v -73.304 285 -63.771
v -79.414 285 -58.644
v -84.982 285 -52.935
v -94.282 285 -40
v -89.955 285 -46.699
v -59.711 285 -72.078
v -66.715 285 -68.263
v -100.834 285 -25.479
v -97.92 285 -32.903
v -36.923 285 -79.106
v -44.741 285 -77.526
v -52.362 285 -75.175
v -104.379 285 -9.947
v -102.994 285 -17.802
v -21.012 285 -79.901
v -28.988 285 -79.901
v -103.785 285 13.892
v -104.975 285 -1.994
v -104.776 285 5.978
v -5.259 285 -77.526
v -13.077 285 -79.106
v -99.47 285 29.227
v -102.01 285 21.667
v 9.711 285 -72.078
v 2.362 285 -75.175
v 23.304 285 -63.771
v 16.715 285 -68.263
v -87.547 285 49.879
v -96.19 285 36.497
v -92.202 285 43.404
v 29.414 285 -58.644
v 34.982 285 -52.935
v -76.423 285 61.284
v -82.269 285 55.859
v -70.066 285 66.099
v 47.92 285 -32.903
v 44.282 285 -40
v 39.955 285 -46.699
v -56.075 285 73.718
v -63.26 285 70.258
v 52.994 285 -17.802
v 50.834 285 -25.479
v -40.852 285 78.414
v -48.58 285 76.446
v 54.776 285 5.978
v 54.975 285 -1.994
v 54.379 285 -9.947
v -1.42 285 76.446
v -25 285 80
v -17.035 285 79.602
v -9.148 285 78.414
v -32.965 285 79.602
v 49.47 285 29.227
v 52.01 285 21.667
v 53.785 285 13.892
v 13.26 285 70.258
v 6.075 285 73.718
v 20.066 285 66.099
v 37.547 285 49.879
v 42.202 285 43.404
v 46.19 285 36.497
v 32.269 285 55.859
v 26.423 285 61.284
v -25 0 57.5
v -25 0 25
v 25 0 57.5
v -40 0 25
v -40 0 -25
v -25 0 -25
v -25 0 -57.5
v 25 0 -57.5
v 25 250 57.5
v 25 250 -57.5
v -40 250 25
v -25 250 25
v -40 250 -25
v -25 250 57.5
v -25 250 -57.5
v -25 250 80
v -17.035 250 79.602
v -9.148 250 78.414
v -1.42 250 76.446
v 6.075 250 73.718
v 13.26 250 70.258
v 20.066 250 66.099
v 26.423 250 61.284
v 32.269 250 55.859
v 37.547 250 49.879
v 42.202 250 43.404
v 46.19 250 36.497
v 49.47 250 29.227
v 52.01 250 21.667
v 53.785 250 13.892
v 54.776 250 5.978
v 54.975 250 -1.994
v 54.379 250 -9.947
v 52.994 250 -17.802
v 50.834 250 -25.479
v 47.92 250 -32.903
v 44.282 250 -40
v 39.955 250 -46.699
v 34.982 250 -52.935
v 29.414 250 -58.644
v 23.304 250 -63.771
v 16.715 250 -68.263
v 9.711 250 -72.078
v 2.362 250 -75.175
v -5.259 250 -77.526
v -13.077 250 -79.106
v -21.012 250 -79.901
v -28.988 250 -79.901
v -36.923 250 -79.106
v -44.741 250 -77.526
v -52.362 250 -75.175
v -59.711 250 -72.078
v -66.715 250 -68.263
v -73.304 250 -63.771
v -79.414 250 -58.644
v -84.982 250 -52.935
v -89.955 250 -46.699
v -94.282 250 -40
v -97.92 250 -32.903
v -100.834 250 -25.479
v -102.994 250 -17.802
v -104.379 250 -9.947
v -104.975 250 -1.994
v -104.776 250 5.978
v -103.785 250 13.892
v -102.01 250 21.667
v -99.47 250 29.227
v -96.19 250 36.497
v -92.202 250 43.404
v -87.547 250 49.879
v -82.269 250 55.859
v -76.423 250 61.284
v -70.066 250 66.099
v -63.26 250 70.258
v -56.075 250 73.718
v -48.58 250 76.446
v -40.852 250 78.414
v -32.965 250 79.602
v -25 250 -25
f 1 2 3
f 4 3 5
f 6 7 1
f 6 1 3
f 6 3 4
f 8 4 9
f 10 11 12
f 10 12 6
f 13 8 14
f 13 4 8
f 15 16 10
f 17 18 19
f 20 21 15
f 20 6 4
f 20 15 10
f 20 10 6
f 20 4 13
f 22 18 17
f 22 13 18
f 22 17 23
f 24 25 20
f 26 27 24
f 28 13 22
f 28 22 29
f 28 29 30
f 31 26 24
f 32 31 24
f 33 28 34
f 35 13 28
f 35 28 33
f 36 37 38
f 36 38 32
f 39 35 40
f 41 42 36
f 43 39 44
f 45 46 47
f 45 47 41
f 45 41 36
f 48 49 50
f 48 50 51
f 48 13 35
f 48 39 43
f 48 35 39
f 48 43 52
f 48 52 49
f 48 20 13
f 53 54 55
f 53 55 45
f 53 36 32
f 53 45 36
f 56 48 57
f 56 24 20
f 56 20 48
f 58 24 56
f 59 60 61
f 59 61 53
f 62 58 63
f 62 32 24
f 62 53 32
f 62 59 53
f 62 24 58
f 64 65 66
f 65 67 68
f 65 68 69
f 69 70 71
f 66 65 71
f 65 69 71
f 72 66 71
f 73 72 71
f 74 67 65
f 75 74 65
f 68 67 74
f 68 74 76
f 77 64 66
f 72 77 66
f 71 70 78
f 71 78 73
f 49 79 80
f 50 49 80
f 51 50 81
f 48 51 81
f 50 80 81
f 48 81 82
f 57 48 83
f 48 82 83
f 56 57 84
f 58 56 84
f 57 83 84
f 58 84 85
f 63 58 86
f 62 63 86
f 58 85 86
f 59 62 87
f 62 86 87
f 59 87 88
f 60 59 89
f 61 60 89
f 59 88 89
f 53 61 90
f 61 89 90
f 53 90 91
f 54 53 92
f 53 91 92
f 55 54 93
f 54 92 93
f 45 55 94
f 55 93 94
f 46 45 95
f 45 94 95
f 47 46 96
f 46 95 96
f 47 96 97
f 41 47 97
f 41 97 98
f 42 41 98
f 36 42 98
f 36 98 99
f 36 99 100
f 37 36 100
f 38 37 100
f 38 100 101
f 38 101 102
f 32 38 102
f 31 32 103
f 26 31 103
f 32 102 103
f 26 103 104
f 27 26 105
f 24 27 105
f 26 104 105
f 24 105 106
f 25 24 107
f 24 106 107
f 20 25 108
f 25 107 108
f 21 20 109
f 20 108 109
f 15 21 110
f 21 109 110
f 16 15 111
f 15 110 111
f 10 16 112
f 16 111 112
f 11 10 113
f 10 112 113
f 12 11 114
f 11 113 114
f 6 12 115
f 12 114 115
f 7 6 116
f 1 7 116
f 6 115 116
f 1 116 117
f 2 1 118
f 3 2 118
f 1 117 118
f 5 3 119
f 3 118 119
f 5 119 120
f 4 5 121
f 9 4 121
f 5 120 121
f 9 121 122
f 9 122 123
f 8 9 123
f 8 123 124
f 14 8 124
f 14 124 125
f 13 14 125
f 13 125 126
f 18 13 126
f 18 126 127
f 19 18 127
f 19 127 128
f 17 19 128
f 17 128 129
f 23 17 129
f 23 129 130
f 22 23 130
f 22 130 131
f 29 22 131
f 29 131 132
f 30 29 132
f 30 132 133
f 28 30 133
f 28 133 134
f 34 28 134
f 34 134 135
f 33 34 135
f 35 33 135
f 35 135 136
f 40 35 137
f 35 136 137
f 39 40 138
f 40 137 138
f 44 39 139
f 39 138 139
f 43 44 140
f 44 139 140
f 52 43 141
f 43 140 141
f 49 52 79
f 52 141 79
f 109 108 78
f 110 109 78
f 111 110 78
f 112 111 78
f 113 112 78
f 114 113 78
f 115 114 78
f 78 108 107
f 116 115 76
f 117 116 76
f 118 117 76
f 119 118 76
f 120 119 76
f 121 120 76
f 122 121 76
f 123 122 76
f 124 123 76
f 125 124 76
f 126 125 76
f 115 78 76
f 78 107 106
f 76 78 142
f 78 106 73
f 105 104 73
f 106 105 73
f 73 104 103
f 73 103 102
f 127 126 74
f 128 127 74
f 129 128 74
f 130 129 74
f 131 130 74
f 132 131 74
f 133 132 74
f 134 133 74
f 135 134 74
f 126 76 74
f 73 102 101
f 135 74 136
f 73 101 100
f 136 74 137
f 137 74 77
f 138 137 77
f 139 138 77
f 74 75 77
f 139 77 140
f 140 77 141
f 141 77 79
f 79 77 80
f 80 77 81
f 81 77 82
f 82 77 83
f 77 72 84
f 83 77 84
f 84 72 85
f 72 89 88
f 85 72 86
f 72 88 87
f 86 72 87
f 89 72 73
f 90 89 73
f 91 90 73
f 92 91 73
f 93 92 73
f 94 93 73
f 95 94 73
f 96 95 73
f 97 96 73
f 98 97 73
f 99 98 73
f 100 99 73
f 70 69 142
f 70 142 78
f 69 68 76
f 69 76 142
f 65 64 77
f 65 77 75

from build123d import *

# Parameters (mm, degrees)
CROQUIS1_W              = 15
CROQUIS1_H              = 50
CROQUIS1_W_2            = 50
CROQUIS1_H_2            = 115
SALIENTE_EXTRUIR1_DEPTH = 250
CROQUIS2_R              = 80
SALIENTE_EXTRUIR2_DEPTH = 35


with BuildPart() as part:
    # Croquis1 → Saliente-Extruir1 (new body)
    with BuildSketch(Plane(origin=(0, 0, 0), x_dir=(1, 0, 0), z_dir=(0, 1, 0))):
        with Locations((-32.5, 0)):
            Rectangle(CROQUIS1_W, CROQUIS1_H)
        Rectangle(CROQUIS1_W_2, CROQUIS1_H_2)
    extrude(amount=SALIENTE_EXTRUIR1_DEPTH)

    # Croquis2 → Saliente-Extruir2 (add)
    with BuildSketch(Plane(origin=(0, 250, 0), x_dir=(1, 0, 0), z_dir=(0, 1, 0))):
        with Locations(Location((-25, 0, 0), (0, 0, 270))):
            Circle(CROQUIS2_R)
    extrude(amount=SALIENTE_EXTRUIR2_DEPTH)


solid = part.part
